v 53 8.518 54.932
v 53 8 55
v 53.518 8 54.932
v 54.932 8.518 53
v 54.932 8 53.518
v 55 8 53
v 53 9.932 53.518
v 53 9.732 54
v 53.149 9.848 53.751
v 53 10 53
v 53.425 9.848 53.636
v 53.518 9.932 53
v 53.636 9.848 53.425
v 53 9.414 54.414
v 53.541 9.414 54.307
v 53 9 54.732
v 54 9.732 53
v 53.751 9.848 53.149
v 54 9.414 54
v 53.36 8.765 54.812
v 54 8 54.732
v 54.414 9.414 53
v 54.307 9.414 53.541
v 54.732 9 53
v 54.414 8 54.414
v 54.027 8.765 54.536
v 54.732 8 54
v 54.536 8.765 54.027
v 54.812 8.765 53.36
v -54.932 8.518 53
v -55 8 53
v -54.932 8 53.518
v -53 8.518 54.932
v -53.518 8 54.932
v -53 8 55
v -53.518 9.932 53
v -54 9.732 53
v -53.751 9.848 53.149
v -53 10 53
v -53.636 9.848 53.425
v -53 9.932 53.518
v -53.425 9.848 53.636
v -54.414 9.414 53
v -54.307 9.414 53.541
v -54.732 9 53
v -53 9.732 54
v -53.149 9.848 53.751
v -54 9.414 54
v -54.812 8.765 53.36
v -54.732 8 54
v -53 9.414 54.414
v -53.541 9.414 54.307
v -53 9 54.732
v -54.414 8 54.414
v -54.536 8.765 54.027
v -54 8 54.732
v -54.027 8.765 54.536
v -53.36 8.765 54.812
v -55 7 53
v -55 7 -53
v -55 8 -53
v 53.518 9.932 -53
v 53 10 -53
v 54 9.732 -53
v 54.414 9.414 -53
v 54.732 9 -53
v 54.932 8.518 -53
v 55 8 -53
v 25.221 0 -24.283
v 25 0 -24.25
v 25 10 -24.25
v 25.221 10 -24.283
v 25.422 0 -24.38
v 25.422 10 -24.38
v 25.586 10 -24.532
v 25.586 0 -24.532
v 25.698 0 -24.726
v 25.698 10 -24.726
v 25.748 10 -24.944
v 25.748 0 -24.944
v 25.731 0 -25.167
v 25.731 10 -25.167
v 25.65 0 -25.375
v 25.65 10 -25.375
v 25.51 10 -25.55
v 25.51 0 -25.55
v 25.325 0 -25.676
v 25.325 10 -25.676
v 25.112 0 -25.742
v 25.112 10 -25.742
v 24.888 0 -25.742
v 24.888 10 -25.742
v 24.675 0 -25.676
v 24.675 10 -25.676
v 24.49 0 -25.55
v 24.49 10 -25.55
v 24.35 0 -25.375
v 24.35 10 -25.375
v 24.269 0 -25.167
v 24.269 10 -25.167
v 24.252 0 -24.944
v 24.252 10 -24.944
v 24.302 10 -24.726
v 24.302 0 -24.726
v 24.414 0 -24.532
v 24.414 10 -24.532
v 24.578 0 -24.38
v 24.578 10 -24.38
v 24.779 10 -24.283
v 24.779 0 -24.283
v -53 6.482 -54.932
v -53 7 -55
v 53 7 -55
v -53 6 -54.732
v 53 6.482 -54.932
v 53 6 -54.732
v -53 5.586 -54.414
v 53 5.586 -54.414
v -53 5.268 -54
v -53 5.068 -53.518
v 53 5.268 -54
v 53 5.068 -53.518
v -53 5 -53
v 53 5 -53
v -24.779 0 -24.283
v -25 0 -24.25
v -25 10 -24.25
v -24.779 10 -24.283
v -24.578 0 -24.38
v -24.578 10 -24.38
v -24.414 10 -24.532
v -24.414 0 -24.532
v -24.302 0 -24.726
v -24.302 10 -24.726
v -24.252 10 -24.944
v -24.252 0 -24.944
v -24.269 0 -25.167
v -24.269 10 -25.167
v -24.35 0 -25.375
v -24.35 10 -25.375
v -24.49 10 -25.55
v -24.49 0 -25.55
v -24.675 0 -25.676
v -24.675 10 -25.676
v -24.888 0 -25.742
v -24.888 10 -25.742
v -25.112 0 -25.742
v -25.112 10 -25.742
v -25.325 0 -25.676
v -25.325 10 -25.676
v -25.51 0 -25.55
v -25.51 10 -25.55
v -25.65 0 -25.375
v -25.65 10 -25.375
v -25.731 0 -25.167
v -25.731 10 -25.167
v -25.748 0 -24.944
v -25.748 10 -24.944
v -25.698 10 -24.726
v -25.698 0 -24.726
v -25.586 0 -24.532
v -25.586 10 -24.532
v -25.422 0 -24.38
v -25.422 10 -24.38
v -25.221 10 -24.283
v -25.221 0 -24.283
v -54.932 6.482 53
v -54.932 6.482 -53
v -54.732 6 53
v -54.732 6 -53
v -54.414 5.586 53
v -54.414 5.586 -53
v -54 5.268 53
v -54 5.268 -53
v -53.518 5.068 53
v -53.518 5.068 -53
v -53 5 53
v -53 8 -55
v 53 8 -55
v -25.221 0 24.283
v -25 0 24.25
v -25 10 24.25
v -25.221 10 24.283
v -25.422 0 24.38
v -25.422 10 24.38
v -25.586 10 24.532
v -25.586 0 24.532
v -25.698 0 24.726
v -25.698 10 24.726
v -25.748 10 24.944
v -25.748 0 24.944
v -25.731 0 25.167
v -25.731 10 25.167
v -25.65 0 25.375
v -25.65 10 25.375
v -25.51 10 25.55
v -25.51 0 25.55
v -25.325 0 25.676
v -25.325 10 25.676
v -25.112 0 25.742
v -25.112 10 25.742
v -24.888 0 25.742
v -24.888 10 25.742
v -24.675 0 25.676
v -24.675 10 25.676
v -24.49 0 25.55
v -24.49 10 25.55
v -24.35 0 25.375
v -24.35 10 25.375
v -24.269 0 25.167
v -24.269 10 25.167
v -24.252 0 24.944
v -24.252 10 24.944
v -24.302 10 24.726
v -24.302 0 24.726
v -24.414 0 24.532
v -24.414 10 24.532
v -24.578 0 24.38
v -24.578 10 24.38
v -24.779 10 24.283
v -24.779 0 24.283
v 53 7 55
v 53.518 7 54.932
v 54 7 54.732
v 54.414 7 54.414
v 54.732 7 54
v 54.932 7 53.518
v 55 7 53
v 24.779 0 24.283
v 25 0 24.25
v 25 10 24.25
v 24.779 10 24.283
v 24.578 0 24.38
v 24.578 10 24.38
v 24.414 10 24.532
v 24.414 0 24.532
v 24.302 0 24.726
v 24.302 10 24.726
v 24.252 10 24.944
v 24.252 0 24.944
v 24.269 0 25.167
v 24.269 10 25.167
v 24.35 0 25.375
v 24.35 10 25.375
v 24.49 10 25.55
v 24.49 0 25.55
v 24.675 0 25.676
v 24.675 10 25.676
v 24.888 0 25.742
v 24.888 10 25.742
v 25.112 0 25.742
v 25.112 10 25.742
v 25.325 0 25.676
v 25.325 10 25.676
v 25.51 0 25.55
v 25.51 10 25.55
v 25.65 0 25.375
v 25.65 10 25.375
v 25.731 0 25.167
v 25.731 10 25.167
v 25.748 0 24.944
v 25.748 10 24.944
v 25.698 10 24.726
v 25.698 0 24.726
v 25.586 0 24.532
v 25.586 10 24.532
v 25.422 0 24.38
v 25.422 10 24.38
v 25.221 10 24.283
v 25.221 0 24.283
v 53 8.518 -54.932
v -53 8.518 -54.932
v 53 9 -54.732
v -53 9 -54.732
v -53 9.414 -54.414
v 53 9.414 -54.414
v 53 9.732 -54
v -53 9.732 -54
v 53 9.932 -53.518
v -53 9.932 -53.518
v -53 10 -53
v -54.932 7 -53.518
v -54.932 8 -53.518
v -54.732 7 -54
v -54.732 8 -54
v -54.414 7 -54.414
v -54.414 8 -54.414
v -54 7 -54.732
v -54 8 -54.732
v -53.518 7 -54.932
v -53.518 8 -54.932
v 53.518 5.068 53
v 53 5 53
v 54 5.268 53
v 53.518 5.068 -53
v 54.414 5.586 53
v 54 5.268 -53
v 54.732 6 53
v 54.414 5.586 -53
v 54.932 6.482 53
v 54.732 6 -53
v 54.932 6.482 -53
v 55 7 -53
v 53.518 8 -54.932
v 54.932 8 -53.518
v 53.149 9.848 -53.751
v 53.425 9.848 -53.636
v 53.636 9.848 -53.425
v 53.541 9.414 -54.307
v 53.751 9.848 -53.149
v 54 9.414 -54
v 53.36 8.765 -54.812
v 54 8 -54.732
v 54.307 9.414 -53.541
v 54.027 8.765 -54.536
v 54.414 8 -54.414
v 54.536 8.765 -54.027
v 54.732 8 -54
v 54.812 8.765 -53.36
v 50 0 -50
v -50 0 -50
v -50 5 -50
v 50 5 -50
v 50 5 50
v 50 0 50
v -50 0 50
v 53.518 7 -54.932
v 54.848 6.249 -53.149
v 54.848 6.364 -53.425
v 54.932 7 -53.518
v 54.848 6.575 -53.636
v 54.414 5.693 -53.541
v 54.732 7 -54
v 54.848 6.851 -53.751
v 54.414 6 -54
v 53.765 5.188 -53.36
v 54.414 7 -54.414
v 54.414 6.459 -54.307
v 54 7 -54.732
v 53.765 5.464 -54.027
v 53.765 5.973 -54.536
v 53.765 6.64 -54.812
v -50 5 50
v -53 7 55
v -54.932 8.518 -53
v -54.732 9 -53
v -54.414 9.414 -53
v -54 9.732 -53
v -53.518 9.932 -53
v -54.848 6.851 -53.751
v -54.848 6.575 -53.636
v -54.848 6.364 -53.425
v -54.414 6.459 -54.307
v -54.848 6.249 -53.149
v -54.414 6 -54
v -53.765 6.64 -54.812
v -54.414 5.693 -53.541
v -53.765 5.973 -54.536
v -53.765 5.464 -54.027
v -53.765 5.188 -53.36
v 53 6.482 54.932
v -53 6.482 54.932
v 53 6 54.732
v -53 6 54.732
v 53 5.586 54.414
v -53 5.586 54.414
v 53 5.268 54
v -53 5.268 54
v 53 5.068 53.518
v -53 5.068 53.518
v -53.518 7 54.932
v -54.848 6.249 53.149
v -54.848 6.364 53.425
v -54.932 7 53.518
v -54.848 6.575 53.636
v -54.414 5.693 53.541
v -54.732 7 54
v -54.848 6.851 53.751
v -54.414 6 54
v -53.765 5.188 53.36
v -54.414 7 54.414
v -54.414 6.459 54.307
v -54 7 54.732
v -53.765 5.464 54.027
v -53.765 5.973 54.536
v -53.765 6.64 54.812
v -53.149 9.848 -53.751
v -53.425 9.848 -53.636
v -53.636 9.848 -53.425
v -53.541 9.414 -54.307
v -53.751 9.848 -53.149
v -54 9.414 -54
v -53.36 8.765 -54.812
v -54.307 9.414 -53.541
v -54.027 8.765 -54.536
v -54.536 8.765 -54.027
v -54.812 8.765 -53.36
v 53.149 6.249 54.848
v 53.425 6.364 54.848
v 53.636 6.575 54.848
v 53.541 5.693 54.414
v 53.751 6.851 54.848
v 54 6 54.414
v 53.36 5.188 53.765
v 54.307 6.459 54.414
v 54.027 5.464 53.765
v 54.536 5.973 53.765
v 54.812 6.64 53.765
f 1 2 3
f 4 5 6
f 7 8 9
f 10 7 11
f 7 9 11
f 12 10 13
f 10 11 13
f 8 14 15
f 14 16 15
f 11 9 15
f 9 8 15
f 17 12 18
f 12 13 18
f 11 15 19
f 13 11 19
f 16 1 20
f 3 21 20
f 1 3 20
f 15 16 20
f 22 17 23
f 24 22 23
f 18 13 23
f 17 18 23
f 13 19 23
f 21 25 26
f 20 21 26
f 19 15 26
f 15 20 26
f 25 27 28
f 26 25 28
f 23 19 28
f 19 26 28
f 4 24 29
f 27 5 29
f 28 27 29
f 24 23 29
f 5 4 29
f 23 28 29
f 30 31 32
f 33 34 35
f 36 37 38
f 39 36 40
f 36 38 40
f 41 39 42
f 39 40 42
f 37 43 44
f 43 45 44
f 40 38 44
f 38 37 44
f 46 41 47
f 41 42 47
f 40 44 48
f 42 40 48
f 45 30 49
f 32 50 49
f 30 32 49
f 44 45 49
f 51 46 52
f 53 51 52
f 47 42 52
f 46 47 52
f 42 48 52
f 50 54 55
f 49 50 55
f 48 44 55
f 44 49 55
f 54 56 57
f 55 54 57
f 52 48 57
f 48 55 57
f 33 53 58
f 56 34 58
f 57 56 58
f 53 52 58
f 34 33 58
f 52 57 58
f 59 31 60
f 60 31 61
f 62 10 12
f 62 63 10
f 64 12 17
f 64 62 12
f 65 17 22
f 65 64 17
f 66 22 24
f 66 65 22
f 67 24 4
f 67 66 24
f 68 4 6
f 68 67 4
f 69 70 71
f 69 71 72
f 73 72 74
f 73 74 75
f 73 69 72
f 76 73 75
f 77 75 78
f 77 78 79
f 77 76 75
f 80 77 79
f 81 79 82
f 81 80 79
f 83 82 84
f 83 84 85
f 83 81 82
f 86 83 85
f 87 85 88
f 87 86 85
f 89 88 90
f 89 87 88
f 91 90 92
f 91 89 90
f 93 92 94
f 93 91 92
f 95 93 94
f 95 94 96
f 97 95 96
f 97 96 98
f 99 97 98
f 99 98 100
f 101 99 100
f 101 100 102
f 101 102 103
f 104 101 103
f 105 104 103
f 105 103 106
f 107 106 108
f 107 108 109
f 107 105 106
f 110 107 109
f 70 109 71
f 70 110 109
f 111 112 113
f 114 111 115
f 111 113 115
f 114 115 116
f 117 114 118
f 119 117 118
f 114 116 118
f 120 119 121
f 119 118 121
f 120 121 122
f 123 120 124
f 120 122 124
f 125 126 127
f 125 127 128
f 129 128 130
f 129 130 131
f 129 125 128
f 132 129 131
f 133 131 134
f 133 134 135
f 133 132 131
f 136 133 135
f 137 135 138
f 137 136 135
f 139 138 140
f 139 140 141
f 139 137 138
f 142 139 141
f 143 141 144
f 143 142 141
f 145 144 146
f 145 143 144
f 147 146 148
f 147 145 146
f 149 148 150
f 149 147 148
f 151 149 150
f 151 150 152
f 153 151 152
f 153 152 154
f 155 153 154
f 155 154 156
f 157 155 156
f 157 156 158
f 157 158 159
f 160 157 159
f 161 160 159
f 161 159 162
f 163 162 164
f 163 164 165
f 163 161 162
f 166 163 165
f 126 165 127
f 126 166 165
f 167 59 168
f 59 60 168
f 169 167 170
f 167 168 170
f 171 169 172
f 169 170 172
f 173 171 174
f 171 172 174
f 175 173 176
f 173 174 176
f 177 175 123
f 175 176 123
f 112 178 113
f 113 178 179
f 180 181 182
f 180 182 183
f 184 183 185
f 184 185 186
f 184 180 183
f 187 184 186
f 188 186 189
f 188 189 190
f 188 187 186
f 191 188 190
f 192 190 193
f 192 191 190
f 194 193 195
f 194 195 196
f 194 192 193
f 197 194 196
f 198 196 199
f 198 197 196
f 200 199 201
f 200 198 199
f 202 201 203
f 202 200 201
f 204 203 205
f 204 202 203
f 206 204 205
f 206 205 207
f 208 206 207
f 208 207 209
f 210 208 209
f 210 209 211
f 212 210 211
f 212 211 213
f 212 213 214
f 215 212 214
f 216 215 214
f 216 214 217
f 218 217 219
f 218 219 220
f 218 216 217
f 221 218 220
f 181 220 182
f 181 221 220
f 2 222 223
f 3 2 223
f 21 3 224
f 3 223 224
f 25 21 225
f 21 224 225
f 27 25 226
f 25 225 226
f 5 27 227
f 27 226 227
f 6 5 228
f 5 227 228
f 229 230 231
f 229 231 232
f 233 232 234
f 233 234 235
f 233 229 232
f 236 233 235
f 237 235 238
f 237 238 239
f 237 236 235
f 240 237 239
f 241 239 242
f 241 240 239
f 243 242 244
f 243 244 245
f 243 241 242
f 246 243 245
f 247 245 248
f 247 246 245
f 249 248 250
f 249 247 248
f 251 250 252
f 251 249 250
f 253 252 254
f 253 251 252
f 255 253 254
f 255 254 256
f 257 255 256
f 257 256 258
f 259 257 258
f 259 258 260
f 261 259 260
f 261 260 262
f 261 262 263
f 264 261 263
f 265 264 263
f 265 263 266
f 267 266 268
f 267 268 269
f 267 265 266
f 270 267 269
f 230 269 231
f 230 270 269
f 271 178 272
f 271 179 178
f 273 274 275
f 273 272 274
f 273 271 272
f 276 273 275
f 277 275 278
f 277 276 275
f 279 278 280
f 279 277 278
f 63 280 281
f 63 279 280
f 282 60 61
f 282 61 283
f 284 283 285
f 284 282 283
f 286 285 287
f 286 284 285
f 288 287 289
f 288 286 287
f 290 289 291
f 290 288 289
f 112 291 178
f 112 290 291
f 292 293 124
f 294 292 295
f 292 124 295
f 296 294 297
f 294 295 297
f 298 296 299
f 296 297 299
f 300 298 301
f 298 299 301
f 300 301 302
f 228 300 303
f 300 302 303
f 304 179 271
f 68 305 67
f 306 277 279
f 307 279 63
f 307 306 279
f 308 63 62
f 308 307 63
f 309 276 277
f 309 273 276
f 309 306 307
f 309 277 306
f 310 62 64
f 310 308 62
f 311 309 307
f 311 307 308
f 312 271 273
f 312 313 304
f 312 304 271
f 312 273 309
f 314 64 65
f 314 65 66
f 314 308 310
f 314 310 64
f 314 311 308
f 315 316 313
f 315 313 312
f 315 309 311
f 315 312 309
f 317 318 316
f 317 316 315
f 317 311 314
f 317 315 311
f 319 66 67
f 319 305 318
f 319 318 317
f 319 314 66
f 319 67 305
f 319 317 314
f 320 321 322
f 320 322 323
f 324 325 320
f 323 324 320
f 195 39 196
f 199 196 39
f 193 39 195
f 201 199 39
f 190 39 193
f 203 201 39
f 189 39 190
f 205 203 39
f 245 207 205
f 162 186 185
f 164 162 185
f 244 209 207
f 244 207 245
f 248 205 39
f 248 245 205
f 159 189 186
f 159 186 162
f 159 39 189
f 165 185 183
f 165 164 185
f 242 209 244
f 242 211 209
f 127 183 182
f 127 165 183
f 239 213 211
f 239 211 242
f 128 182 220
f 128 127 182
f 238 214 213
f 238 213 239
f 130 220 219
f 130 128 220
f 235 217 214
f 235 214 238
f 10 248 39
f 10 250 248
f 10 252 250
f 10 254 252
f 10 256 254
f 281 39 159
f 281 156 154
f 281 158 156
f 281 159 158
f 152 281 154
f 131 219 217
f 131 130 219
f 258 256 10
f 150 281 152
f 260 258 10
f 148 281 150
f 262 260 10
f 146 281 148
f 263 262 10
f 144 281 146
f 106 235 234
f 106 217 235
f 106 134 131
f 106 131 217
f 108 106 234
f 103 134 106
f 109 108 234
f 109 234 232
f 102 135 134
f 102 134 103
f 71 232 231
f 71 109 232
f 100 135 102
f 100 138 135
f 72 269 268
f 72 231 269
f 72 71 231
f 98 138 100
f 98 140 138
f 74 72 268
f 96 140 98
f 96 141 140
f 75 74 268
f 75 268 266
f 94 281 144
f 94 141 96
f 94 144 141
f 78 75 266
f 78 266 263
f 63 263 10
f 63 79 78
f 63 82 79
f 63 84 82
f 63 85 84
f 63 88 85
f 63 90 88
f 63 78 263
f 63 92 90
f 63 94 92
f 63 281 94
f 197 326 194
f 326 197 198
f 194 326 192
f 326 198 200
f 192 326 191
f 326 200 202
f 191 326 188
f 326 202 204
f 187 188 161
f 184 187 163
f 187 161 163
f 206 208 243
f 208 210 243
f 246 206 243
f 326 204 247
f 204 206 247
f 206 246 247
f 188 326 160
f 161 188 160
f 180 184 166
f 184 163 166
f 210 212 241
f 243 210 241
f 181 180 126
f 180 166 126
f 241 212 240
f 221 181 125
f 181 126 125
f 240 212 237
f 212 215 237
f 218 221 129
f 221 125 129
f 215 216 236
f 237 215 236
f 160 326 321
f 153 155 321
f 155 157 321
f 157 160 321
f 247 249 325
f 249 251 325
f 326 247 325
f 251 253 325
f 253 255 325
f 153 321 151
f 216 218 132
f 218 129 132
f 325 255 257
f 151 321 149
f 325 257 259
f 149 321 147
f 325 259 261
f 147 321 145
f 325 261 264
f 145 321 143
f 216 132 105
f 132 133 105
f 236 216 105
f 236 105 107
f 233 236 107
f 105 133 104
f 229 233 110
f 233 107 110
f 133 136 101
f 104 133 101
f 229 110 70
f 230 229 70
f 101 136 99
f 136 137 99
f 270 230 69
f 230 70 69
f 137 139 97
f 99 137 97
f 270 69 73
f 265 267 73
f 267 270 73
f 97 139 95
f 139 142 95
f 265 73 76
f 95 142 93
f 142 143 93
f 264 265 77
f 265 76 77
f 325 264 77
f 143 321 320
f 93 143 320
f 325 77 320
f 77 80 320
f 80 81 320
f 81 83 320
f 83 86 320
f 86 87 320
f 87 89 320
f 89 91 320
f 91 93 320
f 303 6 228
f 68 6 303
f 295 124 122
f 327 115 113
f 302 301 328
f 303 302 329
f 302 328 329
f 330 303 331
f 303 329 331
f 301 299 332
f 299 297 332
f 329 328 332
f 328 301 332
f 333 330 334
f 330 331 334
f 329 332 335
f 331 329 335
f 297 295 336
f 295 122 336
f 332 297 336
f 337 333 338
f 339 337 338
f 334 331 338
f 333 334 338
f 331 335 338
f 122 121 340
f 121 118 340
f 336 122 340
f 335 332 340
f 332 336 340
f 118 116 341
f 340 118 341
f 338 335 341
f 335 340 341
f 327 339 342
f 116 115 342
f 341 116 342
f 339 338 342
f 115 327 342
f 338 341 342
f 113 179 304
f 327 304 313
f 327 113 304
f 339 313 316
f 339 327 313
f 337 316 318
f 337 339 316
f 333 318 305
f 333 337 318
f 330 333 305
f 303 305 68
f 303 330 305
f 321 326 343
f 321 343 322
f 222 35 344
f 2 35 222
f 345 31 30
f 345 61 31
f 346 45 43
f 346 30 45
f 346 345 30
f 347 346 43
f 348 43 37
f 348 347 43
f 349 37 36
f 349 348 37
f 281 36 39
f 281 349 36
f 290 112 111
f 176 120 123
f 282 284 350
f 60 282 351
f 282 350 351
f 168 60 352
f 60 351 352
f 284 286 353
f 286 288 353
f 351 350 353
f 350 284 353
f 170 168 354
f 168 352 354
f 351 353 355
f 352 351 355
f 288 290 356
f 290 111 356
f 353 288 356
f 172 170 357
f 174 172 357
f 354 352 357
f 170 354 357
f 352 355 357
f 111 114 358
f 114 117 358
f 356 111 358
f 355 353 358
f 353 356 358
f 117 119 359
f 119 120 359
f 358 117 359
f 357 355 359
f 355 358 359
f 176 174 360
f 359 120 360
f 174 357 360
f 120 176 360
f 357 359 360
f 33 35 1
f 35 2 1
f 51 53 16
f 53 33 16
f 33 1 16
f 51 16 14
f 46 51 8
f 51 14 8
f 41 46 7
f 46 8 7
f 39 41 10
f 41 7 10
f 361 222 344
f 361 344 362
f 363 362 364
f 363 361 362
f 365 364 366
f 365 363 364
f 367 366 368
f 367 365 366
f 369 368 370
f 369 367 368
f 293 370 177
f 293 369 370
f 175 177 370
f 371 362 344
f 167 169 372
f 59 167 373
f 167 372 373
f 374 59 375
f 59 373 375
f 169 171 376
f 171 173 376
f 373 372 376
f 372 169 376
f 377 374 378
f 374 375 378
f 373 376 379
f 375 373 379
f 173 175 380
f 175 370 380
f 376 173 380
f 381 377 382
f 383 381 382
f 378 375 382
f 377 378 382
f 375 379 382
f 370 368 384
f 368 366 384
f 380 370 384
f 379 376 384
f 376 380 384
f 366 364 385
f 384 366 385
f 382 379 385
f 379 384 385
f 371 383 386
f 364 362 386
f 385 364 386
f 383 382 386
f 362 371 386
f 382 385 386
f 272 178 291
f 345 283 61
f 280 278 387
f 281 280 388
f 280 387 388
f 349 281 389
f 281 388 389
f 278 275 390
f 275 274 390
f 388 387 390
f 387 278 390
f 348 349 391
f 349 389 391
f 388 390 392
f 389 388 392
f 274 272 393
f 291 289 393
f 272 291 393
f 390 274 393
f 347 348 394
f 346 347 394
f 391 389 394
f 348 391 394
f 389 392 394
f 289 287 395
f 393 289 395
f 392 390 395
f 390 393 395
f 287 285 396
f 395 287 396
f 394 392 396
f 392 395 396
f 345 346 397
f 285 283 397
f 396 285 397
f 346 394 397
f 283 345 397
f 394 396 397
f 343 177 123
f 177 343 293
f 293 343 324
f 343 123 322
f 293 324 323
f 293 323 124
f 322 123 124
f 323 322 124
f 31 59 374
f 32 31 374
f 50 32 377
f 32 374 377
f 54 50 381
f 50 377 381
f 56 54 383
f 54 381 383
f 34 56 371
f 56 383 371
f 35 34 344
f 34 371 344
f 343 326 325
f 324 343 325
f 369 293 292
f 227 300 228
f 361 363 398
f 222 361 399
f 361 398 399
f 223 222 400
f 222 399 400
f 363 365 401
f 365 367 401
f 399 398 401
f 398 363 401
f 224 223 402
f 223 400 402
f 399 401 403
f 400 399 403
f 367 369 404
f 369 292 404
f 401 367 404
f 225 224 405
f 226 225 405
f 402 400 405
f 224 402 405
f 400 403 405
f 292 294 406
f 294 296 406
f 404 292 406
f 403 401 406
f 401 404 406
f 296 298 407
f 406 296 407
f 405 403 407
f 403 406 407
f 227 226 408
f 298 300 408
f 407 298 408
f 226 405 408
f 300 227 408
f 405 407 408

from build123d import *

# Parameters (mm, degrees)
SKETCH1_W           = 100
SKETCH1_H           = 100
SKETCH1_R           = 0.75
BOSS_EXTRUDE1_DEPTH = 10
SKETCH2_W           = 110
SKETCH2_H           = 110
SKETCH2_W_2         = 100
SKETCH2_H_2         = 100
BOSS_EXTRUDE3_DEPTH = 5
FILLET2_R           = 2


with BuildPart() as part:
    # Sketch1 → Boss-Extrude1 (new body)
    with BuildSketch(Plane(origin=(0, 0, 0), x_dir=(1, 0, 0), z_dir=(0, 1, 0))):
        Rectangle(SKETCH1_W, SKETCH1_H)
        with Locations(Location((-25, 25, 0), (0, 0, 270))):
            Circle(SKETCH1_R, mode=Mode.SUBTRACT)
        with Locations(Location((25, -25, 0), (0, 0, 90))):
            Circle(SKETCH1_R, mode=Mode.SUBTRACT)
        with Locations(Location((25, 25, 0), (0, 0, 270))):
            Circle(SKETCH1_R, mode=Mode.SUBTRACT)
        with Locations(Location((-25, -25, 0), (0, 0, 90))):
            Circle(SKETCH1_R, mode=Mode.SUBTRACT)
    extrude(amount=BOSS_EXTRUDE1_DEPTH)

    # Sketch2 → Boss-Extrude3 (add)
    with BuildSketch(Plane(origin=(0, 10, 0), x_dir=(1, 0, 0), z_dir=(0, 1, 0))):
        Rectangle(SKETCH2_W, SKETCH2_H)
        Rectangle(SKETCH2_W_2, SKETCH2_H_2, mode=Mode.SUBTRACT)
    extrude(amount=-BOSS_EXTRUDE3_DEPTH)

    # Fillet2
    fillet2_edges = [part.edges().sort_by_distance(p)[0] for p in [
        (0, 5, -55),
        (-55, 7.5, -55),
        (55, 5, 0),
        (55, 7.5, -55),
        (0, 5, 55),
        (55, 7.5, 55),
        (-55, 5, 0),
        (-55, 7.5, 55),
        (0, 10, -55),
        (-55, 10, 0),
        (0, 10, 55),
        (55, 10, 0),
    ]]
    fillet(fillet2_edges, radius=FILLET2_R)


solid = part.part
